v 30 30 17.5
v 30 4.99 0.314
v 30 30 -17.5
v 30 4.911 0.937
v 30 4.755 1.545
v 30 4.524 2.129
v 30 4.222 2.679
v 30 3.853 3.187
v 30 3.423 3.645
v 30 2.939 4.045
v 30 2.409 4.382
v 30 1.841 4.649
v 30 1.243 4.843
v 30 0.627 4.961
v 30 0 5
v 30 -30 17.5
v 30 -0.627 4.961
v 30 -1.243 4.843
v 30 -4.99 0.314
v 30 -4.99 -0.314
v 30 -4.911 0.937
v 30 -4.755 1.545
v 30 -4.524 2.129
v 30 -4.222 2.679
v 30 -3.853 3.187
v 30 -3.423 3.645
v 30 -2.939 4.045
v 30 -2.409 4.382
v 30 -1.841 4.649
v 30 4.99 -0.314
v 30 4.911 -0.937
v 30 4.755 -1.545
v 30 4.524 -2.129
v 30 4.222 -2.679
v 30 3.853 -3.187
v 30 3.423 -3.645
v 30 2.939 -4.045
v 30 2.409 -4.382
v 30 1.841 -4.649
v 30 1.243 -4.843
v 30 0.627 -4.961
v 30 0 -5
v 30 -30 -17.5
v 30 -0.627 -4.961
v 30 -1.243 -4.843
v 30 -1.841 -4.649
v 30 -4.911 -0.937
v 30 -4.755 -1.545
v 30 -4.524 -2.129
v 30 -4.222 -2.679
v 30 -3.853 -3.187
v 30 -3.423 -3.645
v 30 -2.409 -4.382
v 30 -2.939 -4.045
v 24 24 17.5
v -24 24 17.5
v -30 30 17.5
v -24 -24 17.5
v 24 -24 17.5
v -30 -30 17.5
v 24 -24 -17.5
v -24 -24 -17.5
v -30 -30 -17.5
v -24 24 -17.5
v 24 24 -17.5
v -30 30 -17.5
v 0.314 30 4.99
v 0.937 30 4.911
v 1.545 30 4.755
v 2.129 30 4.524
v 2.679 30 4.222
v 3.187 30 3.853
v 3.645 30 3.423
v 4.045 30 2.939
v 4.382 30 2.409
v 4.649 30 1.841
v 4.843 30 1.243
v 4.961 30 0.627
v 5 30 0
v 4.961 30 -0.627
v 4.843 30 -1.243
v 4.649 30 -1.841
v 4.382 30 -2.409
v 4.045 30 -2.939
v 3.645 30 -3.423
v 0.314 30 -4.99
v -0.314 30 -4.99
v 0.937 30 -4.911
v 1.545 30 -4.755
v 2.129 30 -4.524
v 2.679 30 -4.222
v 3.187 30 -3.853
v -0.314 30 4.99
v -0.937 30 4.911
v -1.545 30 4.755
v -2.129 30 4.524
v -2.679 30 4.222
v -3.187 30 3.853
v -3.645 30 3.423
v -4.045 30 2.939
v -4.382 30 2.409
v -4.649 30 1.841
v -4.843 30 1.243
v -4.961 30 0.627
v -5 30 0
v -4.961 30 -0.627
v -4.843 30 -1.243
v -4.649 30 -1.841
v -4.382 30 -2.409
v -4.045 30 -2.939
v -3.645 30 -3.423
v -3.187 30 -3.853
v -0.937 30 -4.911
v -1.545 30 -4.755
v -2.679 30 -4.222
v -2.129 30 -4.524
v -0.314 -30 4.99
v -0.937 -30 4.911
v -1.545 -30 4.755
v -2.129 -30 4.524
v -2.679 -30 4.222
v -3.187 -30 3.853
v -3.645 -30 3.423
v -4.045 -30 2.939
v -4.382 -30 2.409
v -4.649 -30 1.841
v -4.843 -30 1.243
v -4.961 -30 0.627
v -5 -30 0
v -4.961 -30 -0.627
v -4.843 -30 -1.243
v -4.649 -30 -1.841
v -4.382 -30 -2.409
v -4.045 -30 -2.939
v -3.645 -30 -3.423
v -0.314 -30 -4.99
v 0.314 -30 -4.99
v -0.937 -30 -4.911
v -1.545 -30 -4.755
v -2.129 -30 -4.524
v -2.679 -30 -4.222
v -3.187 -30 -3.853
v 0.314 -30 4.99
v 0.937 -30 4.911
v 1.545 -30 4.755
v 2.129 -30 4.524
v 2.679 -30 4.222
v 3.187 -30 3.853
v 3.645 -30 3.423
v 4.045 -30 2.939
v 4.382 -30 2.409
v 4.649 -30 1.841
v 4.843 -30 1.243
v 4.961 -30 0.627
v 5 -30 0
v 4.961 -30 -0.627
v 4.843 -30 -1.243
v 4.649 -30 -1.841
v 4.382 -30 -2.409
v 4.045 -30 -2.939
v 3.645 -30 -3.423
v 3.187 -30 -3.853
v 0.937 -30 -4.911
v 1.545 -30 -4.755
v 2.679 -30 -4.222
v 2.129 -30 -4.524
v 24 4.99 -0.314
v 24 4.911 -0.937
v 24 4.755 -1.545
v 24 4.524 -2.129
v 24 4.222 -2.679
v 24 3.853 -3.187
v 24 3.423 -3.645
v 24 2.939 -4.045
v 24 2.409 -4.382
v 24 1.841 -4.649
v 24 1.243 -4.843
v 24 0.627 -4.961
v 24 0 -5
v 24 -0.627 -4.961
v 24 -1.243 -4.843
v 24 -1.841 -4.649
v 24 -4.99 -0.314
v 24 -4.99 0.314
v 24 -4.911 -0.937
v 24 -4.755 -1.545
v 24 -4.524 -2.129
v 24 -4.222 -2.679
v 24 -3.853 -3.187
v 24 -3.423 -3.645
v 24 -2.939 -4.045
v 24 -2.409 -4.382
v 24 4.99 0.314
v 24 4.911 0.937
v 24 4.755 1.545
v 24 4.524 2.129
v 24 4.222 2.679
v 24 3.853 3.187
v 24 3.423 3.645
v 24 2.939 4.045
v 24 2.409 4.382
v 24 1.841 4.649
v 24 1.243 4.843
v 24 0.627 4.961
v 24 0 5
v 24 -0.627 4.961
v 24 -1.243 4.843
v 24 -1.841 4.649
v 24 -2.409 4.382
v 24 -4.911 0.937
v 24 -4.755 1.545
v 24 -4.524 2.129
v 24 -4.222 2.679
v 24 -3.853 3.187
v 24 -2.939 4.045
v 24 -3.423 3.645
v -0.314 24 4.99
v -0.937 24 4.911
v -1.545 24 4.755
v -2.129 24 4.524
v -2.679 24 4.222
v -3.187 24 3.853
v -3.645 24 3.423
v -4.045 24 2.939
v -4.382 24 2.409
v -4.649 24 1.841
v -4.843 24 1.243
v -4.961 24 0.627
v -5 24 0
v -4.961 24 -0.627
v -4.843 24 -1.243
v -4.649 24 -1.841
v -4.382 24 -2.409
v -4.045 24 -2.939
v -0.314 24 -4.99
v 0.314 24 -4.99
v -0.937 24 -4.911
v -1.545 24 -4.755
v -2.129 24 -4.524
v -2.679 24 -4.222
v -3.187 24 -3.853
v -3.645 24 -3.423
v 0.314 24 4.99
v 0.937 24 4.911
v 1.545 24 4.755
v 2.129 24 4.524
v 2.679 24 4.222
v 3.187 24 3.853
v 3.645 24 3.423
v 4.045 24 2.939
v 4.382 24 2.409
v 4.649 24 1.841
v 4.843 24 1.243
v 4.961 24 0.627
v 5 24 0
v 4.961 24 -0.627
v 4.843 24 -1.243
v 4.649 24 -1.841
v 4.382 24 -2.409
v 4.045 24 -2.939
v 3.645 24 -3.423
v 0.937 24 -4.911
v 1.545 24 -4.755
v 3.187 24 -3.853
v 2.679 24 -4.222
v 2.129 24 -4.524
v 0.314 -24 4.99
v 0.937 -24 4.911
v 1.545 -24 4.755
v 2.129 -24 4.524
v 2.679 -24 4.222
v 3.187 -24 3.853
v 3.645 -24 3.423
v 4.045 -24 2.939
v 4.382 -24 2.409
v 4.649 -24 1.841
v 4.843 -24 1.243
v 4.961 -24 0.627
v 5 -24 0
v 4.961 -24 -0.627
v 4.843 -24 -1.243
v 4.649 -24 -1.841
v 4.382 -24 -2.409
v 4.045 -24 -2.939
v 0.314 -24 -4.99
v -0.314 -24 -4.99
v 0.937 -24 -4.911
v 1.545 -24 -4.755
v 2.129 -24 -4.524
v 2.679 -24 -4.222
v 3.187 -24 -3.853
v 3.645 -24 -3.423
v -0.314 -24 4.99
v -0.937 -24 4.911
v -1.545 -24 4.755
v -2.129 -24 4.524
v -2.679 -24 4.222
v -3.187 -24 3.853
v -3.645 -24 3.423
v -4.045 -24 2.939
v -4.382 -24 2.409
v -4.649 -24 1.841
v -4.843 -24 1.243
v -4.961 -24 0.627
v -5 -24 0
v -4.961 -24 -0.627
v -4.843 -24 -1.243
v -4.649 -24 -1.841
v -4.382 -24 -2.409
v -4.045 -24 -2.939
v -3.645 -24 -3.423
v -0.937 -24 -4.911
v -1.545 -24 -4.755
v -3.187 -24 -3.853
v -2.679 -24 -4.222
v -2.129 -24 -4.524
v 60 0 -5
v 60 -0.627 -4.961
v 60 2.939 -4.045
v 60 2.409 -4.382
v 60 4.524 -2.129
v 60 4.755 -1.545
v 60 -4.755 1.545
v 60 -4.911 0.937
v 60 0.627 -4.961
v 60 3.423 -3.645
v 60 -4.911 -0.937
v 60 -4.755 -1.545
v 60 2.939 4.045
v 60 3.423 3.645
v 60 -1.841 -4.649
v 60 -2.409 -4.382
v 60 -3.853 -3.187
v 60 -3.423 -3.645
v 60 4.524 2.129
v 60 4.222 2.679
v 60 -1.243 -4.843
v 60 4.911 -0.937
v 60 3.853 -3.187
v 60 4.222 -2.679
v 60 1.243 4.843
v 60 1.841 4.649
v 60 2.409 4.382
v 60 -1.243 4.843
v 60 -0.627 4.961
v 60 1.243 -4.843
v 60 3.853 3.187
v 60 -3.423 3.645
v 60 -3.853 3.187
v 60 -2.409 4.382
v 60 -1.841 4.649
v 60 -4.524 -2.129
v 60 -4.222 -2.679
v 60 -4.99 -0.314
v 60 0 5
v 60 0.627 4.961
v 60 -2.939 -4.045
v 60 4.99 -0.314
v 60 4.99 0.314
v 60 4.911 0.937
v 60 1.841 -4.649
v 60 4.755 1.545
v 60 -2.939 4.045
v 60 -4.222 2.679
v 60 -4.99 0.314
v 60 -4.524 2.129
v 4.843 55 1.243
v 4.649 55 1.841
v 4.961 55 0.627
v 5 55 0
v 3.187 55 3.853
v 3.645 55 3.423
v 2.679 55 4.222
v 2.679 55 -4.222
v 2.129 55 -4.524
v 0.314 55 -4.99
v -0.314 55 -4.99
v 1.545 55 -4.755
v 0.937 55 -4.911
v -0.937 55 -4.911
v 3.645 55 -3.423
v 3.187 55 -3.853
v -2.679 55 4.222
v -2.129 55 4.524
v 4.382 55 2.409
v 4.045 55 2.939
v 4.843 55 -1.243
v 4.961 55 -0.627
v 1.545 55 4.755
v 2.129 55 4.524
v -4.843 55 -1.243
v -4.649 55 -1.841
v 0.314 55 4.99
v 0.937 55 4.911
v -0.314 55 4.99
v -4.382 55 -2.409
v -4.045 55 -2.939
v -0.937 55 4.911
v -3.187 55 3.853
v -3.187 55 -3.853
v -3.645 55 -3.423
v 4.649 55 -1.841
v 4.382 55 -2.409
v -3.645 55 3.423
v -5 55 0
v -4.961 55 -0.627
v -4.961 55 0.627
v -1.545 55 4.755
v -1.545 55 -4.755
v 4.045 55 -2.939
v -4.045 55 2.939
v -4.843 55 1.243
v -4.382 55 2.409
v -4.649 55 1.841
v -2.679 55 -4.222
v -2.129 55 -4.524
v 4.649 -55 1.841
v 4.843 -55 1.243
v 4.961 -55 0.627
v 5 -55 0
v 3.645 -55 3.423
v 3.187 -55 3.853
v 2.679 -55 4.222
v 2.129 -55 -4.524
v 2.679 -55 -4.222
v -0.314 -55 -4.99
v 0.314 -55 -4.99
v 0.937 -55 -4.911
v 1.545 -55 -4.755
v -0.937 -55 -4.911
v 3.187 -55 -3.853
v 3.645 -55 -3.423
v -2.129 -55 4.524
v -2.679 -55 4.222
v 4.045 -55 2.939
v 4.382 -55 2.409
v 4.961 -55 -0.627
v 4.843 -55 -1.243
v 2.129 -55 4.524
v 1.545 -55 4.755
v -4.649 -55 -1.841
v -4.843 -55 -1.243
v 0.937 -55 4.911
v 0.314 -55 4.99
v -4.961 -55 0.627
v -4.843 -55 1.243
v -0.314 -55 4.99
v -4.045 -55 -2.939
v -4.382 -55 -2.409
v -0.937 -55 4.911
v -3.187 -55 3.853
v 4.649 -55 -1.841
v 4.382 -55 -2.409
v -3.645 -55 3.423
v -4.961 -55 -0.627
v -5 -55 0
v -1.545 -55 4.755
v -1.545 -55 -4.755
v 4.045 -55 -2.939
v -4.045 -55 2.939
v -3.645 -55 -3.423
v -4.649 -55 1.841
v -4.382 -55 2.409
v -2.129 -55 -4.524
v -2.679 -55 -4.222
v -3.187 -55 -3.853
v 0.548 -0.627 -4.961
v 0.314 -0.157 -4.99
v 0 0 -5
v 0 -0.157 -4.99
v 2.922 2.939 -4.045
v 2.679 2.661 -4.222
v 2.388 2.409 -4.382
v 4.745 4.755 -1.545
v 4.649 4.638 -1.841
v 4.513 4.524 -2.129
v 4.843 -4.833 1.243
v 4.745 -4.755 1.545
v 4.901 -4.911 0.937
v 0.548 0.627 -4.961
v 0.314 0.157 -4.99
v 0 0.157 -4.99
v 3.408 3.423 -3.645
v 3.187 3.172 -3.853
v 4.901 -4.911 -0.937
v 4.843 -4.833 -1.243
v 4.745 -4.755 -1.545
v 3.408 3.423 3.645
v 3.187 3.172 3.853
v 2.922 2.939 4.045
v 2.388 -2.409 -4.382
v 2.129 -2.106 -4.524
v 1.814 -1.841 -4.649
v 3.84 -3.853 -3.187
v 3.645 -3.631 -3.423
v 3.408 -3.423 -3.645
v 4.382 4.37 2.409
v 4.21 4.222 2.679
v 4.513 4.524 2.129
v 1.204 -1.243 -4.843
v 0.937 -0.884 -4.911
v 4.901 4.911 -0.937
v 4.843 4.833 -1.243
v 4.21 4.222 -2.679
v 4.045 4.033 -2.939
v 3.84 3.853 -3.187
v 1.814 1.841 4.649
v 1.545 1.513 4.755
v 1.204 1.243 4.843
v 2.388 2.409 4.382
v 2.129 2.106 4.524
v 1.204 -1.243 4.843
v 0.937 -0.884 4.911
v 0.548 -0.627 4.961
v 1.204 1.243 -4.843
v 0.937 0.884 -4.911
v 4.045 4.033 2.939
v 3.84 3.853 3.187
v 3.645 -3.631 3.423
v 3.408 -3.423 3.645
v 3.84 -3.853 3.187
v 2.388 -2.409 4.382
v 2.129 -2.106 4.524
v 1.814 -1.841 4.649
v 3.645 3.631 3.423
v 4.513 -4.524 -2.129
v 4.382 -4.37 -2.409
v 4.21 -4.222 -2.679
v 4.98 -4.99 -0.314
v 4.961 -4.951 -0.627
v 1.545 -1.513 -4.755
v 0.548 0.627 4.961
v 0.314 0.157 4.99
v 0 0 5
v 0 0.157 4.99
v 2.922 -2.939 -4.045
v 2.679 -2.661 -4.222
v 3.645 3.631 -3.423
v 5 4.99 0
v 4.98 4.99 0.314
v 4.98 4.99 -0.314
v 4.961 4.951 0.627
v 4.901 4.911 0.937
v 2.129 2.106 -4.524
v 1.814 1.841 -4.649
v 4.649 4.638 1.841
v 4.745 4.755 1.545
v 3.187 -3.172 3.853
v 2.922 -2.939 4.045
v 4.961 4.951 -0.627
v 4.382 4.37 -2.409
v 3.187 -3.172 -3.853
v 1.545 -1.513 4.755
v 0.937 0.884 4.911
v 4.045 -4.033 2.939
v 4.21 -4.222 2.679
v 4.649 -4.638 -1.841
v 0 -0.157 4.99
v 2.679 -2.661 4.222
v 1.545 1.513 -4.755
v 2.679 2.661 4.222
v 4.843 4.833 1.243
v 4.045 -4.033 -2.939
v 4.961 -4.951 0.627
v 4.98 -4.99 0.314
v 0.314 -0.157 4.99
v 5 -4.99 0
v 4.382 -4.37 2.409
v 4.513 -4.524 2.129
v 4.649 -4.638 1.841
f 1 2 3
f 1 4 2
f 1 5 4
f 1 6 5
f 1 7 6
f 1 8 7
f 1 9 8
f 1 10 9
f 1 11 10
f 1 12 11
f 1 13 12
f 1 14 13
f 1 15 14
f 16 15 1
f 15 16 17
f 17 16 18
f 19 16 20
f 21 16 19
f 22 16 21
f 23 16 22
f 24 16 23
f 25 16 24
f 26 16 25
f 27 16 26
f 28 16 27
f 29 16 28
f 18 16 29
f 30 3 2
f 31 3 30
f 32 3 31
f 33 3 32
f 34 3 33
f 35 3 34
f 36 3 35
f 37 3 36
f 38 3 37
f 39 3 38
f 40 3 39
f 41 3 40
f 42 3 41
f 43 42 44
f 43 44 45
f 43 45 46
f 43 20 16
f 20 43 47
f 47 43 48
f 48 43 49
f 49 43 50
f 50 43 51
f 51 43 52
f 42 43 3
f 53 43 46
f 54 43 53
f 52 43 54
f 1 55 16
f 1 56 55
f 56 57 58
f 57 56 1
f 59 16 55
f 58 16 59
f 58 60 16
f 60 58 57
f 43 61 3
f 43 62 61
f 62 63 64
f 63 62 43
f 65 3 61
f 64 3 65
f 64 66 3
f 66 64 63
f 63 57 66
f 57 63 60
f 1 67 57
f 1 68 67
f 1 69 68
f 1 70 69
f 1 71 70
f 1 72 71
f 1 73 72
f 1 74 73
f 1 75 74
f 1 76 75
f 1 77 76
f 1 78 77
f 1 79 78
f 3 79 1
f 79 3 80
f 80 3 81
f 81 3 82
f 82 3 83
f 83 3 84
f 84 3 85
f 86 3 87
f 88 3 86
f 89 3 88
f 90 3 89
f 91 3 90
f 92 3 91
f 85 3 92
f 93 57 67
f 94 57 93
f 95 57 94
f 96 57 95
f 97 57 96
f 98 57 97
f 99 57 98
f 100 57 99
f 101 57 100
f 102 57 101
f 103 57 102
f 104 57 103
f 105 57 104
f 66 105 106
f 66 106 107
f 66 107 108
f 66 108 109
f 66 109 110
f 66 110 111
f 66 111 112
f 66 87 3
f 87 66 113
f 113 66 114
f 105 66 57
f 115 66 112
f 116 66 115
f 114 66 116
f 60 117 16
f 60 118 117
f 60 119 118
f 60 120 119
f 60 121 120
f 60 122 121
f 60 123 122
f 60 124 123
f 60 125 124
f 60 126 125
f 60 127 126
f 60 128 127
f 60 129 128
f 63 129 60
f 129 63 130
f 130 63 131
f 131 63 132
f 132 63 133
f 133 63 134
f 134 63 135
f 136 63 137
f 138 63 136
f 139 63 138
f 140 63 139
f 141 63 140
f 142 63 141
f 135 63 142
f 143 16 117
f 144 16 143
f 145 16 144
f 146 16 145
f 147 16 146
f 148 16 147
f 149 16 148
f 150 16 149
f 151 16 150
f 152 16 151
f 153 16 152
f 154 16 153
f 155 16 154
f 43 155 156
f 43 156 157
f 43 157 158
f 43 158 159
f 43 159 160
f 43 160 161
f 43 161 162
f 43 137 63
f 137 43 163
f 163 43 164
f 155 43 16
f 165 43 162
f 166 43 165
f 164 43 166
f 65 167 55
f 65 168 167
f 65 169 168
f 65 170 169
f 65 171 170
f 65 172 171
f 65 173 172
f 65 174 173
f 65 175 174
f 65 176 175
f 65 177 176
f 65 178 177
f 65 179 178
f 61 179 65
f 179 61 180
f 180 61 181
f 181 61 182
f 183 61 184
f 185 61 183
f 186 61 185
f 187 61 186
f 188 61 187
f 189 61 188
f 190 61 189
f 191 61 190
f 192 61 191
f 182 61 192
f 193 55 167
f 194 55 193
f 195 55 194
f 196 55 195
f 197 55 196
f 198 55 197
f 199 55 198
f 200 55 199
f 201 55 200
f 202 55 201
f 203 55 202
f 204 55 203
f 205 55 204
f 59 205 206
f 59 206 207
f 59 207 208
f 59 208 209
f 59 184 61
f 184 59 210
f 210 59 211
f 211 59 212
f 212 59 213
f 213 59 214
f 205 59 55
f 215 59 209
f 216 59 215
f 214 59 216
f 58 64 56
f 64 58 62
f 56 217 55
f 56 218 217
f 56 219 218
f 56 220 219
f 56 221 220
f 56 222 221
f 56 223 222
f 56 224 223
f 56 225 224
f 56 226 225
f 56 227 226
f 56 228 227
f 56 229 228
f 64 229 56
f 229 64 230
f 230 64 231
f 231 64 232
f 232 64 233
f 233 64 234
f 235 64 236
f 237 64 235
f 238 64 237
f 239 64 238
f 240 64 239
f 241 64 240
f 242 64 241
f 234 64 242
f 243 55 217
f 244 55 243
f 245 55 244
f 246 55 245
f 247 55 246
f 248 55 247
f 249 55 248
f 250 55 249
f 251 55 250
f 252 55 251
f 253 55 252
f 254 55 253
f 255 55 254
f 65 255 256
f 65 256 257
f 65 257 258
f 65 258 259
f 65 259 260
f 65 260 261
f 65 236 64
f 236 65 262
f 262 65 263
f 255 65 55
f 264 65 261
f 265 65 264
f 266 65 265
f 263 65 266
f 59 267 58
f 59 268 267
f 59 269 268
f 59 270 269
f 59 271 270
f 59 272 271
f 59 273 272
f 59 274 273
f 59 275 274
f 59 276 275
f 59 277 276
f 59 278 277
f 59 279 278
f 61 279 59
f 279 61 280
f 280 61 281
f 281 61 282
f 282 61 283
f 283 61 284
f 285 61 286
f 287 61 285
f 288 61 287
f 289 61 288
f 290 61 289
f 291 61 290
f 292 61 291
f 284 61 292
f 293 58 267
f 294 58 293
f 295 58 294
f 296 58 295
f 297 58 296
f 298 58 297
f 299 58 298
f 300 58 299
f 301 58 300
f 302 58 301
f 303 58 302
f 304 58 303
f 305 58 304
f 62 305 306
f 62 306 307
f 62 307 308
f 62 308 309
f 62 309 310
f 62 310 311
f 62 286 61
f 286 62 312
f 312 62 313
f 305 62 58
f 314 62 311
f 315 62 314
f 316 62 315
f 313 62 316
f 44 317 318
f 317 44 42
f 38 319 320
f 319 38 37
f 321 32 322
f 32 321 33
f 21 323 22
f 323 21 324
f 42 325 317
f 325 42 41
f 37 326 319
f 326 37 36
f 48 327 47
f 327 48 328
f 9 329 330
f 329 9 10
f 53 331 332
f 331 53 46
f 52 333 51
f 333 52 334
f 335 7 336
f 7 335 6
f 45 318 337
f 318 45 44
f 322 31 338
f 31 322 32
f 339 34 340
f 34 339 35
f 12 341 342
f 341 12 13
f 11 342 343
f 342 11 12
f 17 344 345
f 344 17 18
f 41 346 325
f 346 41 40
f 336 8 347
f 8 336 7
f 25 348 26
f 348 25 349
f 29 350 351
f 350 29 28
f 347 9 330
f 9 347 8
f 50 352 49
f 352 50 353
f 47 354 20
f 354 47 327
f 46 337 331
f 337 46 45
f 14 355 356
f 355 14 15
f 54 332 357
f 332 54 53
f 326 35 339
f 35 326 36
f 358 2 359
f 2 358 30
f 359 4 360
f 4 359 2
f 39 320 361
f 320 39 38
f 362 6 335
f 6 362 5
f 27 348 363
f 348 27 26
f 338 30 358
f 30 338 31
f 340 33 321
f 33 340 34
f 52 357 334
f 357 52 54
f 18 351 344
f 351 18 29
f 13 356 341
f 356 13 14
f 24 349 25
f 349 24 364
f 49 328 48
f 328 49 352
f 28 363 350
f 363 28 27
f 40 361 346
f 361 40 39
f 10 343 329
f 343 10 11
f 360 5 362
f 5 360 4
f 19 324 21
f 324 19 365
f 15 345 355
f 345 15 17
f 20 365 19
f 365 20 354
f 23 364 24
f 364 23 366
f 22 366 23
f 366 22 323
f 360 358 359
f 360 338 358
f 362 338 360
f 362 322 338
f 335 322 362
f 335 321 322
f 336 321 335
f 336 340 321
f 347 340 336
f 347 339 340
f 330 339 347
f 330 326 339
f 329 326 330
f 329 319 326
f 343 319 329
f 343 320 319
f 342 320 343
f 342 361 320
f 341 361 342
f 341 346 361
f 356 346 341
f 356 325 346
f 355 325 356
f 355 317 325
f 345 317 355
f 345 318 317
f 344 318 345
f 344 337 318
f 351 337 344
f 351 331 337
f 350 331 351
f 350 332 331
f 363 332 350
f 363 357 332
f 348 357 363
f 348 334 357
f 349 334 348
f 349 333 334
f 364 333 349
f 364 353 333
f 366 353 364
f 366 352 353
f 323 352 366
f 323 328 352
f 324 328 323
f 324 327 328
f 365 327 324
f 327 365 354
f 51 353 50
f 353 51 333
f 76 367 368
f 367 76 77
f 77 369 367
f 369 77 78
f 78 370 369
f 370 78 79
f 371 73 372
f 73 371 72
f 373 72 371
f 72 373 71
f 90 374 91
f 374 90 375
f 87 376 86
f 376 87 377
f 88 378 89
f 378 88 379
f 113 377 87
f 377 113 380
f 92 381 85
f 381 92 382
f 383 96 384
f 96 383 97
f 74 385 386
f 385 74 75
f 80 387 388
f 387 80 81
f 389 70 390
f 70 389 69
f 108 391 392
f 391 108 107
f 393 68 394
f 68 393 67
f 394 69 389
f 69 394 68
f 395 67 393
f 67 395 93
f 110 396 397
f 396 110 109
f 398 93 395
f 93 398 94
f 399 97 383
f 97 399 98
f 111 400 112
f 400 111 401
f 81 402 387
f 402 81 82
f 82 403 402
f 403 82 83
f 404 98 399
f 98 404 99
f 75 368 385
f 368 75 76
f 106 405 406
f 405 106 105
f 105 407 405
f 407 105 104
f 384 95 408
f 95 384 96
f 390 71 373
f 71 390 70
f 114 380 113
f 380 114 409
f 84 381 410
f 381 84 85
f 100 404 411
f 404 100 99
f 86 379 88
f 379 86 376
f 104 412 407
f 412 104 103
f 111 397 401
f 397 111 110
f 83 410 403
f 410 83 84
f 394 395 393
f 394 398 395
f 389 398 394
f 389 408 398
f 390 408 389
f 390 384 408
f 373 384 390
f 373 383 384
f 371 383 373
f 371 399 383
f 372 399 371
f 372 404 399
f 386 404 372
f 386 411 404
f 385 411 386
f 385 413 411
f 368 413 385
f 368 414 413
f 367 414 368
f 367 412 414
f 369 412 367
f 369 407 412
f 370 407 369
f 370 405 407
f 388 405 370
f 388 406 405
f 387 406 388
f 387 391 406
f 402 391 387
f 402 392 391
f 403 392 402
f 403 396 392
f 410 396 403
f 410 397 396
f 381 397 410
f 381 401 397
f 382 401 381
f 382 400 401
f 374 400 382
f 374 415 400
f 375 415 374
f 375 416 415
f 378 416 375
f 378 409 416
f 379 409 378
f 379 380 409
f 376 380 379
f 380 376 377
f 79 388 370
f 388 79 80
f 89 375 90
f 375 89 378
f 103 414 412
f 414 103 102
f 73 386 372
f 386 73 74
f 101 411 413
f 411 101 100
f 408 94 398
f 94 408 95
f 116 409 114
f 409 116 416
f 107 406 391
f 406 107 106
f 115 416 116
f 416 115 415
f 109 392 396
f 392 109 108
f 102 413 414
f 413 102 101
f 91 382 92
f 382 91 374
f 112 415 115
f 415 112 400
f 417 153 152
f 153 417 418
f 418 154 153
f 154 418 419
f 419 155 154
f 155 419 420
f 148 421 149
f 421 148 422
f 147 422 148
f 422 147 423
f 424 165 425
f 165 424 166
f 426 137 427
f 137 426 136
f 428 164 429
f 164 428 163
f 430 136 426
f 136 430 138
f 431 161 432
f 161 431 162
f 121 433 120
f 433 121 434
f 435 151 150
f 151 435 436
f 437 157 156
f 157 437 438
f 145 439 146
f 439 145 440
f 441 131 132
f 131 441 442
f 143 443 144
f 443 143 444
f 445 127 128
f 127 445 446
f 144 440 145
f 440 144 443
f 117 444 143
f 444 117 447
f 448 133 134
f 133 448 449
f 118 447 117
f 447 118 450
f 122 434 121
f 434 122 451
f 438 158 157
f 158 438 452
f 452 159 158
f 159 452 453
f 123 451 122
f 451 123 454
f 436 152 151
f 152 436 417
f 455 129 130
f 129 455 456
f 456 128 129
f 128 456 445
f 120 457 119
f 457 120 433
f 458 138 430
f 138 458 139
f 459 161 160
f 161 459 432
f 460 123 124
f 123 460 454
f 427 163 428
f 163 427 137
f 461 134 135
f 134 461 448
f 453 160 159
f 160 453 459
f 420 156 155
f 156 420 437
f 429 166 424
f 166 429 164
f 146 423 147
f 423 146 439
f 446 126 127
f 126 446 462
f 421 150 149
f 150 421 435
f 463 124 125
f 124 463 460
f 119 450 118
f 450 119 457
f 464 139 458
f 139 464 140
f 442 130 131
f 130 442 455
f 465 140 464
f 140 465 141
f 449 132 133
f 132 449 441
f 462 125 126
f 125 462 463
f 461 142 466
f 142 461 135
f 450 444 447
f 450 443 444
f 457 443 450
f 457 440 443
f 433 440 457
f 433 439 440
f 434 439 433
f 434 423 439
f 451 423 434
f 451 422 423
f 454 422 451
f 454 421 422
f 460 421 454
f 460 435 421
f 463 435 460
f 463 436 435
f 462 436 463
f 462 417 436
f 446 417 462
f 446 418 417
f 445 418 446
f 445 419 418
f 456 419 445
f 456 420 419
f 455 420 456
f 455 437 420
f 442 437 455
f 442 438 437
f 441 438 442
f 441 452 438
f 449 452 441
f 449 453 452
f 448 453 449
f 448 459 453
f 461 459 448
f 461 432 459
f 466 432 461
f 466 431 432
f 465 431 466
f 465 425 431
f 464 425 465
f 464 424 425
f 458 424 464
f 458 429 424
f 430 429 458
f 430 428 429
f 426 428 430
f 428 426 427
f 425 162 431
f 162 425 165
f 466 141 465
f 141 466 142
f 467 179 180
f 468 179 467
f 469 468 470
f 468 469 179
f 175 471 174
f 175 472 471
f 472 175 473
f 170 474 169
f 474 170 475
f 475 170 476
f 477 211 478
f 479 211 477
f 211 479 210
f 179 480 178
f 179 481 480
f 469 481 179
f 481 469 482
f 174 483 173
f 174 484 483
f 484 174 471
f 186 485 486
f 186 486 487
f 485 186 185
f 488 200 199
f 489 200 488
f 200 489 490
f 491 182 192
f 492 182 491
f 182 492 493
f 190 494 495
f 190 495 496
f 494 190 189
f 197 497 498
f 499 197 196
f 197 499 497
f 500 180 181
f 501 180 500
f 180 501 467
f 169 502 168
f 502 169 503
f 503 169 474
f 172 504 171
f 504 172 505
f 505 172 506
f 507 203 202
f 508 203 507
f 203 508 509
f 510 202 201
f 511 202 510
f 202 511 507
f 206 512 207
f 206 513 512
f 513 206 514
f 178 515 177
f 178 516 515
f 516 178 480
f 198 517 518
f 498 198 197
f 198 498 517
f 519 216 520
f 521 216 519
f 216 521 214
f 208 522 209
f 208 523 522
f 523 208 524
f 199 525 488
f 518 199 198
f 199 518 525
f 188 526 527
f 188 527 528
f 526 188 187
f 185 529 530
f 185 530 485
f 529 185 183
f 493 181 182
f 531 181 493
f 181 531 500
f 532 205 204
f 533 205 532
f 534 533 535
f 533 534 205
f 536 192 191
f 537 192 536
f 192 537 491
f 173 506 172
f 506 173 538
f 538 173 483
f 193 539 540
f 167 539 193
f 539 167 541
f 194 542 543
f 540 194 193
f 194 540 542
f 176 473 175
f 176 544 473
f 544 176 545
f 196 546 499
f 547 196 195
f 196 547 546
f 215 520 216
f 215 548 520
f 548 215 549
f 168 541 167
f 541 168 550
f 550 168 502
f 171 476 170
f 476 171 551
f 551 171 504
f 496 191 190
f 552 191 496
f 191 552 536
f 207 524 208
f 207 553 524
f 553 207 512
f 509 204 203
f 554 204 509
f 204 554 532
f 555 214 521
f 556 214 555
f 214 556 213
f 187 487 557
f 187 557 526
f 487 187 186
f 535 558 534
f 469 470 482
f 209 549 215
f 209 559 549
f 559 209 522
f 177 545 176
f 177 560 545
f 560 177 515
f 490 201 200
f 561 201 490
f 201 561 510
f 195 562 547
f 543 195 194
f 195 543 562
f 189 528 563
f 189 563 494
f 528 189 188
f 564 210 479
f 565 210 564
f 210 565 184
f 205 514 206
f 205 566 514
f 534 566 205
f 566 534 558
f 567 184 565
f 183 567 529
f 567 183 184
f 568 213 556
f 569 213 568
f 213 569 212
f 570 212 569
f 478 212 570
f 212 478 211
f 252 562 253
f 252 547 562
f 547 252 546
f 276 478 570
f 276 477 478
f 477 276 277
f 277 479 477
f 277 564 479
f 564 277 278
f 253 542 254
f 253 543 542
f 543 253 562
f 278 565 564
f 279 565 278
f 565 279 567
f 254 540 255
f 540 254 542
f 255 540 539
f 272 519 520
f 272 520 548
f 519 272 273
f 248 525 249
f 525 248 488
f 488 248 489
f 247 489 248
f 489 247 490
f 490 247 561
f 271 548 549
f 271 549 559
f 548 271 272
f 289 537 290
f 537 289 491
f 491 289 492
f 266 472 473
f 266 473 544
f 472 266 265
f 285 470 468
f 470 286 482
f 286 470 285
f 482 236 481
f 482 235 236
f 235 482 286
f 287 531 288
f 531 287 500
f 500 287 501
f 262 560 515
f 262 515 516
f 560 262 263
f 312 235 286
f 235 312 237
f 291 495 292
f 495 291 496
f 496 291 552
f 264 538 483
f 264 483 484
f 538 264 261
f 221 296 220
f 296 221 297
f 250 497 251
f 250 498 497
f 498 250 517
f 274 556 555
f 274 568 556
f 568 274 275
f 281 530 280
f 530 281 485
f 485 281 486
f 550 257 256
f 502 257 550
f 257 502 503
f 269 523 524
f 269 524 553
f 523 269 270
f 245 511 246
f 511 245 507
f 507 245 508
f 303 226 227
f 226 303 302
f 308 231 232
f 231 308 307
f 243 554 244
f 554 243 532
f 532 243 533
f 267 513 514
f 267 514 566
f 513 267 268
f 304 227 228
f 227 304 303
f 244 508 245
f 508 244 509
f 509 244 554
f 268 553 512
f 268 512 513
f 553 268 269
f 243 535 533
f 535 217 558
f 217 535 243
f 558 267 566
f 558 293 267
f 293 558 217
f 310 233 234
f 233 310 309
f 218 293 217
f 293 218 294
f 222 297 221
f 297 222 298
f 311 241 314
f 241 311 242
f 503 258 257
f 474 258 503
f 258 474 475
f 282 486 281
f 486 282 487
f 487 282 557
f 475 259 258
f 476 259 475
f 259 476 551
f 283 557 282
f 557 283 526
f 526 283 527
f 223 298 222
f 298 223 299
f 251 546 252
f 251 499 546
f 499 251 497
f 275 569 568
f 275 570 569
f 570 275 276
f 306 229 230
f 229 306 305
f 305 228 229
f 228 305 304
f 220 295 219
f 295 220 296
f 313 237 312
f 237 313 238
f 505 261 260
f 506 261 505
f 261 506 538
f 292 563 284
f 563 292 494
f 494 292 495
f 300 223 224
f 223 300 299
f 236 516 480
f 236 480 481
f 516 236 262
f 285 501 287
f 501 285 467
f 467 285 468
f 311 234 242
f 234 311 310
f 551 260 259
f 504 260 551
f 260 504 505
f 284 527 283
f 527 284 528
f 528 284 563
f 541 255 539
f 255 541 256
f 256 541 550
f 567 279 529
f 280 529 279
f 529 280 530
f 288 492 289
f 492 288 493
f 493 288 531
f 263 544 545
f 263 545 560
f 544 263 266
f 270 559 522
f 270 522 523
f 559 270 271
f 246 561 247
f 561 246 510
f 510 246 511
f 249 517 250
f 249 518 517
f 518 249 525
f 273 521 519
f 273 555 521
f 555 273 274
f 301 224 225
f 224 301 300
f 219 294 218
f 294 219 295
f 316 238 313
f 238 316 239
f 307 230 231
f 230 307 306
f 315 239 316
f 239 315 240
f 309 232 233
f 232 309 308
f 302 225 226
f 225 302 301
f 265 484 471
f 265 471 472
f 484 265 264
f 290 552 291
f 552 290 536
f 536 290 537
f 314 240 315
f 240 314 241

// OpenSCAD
breite_gehaeuse = 60;
tiefe_gehaeuse = 60;
hoehe_gehaeuse = 35;
wandstaerke = 6;

durchmesser_achse = 10;
ueberstand_achse_x_rechts = 30;
ueberstand_achse_y = 25;

union() {
    difference() {
        cube([breite_gehaeuse, tiefe_gehaeuse, hoehe_gehaeuse], center = true);
        cube([breite_gehaeuse - 2 * wandstaerke, tiefe_gehaeuse - 2 * wandstaerke, hoehe_gehaeuse], center = true);
    }

    translate([breite_gehaeuse/2 + ueberstand_achse_x_rechts/2, 0, 0]) {
        rotate([0, 90, 0]) {
            cylinder(h = ueberstand_achse_x_rechts, d = durchmesser_achse, center = true, $fn = 50);
        }
    }

    translate([0, tiefe_gehaeuse/2 + ueberstand_achse_y/2, 0]) {
        rotate([90, 0, 0]) {
            cylinder(h = ueberstand_achse_y, d = durchmesser_achse, center = true, $fn = 50);
        }
    }

    translate([0, -tiefe_gehaeuse/2 - ueberstand_achse_y/2, 0]) {
        rotate([90, 0, 0]) {
            cylinder(h = ueberstand_achse_y, d = durchmesser_achse, center = true, $fn = 50);
        }
    }

    translate([breite_gehaeuse/4, 0, 0]) {
        rotate([0, 90, 0]) {
            cylinder(h = breite_gehaeuse/2, d = durchmesser_achse, center = true, $fn = 50);
        }
    }

    rotate([90, 0, 0]) {
        cylinder(h = tiefe_gehaeuse, d = durchmesser_achse, center = true, $fn = 50);
    }
}
